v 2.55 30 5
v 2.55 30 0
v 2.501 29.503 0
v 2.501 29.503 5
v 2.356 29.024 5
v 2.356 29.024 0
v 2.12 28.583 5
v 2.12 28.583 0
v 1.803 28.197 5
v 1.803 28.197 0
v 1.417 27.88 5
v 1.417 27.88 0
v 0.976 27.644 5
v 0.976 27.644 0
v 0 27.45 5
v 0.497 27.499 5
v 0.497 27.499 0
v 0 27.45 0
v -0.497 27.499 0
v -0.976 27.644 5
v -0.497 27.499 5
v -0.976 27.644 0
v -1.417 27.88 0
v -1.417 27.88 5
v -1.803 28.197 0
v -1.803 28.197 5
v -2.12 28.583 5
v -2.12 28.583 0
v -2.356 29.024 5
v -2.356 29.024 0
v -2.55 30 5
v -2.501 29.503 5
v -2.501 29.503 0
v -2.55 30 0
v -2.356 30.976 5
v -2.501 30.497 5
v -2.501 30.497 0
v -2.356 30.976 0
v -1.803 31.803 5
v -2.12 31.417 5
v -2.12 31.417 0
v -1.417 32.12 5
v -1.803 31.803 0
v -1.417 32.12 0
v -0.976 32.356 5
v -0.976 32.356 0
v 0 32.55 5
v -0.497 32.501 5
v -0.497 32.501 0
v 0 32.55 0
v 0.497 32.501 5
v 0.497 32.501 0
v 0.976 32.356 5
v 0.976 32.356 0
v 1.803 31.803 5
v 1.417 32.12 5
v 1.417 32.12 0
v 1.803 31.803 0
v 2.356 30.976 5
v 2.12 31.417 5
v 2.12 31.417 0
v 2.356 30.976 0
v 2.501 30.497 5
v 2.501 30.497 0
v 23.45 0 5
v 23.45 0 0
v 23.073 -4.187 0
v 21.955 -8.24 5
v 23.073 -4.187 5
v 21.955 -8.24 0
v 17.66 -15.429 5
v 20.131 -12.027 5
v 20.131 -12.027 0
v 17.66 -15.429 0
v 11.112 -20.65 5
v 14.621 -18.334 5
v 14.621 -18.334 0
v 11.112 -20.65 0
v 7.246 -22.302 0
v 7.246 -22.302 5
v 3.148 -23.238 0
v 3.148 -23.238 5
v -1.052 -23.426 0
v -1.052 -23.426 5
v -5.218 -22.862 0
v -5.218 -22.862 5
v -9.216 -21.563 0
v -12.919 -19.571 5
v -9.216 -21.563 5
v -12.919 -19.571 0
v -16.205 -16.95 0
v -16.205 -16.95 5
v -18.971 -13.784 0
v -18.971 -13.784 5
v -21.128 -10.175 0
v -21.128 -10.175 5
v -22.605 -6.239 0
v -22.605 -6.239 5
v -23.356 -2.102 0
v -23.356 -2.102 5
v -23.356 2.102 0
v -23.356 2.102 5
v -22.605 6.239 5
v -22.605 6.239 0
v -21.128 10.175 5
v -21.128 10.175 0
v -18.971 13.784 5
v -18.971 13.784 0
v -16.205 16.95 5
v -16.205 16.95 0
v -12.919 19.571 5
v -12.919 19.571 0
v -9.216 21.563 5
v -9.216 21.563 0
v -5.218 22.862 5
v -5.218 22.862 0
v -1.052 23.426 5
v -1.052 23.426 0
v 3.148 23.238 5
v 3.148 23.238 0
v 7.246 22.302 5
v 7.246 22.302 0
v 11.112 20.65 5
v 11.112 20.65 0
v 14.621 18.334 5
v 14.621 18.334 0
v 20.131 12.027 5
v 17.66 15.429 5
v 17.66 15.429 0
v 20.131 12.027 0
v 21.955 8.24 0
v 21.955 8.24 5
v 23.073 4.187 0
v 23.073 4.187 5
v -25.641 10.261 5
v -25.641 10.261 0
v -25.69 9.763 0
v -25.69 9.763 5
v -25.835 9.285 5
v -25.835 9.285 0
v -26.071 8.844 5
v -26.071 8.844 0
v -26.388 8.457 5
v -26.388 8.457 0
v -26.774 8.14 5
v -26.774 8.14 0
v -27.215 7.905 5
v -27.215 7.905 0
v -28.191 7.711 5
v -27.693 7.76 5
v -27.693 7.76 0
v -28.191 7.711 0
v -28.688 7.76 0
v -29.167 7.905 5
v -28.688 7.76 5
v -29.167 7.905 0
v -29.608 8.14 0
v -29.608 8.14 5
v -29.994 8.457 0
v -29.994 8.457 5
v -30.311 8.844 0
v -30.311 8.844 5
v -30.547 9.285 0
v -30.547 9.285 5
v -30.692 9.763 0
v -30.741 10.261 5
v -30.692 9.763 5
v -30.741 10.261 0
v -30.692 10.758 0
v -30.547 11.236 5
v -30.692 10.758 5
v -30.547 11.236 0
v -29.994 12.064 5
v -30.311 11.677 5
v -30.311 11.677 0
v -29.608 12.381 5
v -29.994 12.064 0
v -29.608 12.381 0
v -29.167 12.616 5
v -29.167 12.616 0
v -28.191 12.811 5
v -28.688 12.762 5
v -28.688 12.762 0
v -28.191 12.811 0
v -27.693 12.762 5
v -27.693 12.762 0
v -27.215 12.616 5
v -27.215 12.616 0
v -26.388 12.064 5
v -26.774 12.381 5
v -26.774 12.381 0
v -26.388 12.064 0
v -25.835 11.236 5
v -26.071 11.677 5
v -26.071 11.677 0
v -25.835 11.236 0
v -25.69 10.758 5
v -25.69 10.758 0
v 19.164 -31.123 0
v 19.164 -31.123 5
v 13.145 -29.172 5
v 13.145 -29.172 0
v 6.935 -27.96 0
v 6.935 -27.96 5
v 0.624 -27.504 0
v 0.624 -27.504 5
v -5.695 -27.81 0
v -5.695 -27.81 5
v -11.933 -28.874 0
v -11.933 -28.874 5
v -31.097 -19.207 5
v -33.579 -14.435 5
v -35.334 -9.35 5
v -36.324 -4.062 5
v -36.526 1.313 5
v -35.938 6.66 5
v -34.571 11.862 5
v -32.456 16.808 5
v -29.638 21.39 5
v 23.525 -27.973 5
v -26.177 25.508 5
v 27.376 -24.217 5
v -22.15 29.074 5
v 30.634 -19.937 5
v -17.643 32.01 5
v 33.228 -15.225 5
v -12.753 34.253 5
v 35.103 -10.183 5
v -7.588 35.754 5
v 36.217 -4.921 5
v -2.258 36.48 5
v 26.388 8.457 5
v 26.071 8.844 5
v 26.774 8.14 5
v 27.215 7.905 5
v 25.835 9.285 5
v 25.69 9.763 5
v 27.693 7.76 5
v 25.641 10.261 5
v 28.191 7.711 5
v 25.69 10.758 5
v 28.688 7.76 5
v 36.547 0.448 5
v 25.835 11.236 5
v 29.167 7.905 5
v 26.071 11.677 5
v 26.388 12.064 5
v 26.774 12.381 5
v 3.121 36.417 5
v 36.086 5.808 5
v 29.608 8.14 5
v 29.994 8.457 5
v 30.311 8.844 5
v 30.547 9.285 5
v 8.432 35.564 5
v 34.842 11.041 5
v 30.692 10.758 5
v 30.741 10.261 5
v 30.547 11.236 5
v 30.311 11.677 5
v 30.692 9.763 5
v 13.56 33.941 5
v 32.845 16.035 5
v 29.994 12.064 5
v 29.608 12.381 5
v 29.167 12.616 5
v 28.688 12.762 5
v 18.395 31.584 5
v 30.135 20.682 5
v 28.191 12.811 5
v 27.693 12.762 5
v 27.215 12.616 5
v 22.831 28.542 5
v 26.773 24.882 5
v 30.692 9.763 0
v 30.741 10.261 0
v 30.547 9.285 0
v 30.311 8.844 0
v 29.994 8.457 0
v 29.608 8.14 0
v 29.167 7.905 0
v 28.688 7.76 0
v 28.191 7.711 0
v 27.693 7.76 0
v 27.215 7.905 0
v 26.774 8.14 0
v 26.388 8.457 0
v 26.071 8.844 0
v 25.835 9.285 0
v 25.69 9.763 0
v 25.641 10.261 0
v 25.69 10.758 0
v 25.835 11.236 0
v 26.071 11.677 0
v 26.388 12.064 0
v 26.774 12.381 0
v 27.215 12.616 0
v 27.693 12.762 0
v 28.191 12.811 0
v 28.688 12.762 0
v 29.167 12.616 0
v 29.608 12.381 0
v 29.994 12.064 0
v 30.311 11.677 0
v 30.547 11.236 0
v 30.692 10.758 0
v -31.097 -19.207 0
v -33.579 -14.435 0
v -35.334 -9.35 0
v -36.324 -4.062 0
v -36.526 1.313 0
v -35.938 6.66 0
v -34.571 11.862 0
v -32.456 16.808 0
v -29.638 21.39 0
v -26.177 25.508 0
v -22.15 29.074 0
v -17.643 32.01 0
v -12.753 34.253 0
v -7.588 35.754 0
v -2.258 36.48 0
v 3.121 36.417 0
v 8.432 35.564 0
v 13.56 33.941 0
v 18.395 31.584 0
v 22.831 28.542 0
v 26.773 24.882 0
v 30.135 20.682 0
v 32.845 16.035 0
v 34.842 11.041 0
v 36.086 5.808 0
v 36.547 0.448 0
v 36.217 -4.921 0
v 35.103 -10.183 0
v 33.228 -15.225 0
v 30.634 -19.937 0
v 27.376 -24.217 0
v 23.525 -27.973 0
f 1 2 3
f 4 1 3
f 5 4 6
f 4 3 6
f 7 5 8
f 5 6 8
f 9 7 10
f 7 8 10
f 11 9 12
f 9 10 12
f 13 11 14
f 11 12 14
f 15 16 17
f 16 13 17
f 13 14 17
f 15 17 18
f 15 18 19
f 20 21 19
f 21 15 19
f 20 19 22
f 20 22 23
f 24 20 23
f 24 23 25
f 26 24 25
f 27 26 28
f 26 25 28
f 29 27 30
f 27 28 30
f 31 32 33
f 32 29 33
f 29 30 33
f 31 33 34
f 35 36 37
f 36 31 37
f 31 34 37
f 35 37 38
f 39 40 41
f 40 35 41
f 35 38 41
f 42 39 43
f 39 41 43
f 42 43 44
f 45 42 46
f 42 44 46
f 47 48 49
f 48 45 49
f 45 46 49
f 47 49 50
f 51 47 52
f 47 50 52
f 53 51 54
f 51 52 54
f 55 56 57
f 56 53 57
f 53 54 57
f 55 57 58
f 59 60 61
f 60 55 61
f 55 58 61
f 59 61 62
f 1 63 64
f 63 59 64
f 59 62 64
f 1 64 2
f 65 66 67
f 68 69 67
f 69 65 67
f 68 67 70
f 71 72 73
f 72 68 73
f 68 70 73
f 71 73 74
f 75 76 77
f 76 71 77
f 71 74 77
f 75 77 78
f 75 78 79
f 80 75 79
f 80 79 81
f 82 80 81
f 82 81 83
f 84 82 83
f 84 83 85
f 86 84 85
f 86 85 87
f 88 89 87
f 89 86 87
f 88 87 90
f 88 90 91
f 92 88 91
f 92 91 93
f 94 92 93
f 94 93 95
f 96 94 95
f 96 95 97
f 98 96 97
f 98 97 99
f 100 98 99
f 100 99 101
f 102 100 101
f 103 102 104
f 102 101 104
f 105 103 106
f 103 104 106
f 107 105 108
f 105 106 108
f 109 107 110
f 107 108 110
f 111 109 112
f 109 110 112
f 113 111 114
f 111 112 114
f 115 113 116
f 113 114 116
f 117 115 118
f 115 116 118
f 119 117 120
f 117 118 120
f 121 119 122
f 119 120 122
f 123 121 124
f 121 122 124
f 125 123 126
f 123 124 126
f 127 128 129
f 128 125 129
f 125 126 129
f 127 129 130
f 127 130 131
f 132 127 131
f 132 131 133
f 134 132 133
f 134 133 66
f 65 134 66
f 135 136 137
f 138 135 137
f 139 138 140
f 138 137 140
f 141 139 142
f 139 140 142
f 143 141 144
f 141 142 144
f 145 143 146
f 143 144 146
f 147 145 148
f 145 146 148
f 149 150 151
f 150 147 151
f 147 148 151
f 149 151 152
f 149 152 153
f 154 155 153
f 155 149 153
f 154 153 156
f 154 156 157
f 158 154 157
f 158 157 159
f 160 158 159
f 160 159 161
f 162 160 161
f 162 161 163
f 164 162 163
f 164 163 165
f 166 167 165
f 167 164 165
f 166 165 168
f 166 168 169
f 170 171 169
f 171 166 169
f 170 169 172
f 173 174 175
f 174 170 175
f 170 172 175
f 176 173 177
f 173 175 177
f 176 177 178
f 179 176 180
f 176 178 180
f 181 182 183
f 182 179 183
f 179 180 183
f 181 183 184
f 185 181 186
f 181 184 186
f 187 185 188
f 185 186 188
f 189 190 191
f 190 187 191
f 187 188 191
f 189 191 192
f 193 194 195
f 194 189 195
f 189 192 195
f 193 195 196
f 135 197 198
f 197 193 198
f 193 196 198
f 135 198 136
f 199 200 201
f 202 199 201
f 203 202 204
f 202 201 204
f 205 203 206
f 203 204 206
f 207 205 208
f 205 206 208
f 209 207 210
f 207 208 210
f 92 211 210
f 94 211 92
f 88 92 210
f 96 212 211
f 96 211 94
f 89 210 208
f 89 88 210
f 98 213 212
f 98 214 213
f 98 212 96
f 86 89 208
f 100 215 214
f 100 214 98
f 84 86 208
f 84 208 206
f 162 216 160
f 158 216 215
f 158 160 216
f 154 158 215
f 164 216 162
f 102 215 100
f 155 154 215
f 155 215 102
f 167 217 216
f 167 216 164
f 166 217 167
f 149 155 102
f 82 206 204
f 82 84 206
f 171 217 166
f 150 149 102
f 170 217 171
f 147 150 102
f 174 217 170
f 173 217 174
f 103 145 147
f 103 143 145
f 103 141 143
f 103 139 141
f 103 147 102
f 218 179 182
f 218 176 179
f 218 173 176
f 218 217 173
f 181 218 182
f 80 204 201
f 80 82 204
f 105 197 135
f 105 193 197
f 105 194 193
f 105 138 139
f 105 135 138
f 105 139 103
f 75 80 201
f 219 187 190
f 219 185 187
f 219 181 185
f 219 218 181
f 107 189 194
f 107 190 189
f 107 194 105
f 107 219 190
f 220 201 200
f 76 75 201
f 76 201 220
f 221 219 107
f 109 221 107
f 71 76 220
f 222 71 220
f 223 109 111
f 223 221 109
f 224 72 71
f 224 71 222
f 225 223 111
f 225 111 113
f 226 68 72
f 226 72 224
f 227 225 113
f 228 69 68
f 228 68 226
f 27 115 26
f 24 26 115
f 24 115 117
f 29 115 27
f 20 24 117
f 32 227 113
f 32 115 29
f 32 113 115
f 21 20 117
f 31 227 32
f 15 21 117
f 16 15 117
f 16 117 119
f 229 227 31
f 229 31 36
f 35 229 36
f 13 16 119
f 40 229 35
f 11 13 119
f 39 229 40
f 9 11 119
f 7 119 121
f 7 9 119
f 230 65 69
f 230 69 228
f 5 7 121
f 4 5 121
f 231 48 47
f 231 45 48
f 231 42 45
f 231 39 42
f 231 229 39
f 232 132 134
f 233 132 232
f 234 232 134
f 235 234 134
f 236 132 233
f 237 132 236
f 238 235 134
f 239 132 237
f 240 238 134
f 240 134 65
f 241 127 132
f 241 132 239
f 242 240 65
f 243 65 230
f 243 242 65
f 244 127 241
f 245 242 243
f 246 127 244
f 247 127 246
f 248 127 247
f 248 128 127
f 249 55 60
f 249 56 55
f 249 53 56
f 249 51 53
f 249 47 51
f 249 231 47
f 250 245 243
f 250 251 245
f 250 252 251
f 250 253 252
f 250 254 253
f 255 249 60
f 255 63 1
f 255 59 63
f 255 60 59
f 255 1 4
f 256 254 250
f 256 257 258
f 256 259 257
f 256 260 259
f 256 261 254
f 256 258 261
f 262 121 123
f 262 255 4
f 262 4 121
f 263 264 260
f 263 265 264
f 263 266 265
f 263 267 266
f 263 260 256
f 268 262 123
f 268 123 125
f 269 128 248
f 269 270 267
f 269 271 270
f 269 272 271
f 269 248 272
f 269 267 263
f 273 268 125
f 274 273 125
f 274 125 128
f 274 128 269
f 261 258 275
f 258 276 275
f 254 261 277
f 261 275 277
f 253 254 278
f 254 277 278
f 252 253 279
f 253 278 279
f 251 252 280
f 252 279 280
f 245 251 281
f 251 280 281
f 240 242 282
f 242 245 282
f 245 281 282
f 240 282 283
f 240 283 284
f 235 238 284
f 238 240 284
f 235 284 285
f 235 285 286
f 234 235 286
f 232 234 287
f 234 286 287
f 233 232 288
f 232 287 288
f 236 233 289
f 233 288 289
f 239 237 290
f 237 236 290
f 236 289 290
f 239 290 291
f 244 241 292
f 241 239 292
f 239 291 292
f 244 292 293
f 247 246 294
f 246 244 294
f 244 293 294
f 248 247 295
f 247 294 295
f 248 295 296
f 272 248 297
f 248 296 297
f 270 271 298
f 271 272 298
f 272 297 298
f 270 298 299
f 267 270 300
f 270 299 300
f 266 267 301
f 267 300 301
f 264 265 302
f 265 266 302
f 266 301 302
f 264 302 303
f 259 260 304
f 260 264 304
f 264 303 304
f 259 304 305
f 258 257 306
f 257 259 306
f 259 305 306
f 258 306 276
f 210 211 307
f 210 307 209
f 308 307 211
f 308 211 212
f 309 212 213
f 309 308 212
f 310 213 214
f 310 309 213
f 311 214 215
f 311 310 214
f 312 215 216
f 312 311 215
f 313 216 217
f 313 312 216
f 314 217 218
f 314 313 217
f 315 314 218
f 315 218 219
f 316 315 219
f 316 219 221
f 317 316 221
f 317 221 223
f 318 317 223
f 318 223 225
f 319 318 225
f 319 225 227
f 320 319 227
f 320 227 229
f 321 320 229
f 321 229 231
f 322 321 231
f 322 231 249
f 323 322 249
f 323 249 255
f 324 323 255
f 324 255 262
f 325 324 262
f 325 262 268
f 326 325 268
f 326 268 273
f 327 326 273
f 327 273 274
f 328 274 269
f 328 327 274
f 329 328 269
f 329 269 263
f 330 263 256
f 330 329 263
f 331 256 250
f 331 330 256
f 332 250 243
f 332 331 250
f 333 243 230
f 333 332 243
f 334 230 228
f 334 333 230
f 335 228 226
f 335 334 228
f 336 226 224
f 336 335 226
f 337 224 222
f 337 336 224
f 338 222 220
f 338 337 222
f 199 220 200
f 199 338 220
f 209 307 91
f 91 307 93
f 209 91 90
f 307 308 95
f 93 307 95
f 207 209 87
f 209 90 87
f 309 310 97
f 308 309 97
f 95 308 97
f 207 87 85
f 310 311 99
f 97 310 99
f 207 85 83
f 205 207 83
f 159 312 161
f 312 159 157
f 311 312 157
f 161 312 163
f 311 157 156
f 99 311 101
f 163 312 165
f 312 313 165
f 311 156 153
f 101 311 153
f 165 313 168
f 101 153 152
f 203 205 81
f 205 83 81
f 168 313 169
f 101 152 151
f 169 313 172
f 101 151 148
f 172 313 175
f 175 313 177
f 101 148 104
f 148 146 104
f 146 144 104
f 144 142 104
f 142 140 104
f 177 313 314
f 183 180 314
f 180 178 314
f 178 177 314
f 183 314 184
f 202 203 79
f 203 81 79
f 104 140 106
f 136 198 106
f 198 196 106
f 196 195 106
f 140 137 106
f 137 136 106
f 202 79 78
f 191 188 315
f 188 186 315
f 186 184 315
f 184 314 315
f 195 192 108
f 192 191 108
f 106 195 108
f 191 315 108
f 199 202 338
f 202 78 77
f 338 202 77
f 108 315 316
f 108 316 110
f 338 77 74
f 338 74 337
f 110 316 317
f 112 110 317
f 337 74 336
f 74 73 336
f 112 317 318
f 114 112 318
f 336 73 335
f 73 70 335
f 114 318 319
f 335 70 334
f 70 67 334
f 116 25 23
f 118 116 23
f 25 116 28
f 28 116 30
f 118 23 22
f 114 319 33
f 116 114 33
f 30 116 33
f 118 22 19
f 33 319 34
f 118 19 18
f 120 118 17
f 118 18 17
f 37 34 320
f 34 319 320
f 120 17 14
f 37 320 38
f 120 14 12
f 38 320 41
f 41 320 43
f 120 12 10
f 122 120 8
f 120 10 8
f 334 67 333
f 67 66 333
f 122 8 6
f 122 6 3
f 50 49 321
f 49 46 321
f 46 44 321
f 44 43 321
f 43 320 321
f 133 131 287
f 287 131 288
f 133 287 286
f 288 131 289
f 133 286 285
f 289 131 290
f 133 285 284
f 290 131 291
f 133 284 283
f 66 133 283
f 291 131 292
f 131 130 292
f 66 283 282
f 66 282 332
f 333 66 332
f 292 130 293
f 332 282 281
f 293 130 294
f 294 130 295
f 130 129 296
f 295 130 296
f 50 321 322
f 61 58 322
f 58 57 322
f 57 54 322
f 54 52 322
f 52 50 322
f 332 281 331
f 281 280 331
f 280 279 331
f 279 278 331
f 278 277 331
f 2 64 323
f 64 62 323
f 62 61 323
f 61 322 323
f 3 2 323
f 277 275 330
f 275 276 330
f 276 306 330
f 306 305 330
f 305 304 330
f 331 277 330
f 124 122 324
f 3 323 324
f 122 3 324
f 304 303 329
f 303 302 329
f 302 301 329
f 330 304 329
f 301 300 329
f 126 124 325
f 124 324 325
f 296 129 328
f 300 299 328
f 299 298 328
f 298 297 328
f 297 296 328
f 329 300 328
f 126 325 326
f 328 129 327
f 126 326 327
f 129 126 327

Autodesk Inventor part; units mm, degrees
ref_plane "YZ Plane" through (0, 0, 0) normal (1, 0, 0) x (0, 1, 0)
ref_plane "XZ Plane" through (0, 0, 0) normal (0, 1, 0) x (-1, 0, 0)
ref_plane "XY Plane" through (0, 0, 0) normal (0, 0, 1) x (1, 0, 0)
sketch "スケッチ1" plane through (0, 0, 0) normal (0, 0, 1) x (1, 0, 0)
  circle A0 centre (0, 0) radius 23.45
  circle A1 centre (0, 0) radius 36.55
  line L0 (0, 0) -> (-28.1908, 10.2606) construction
  line L1 (0, 0) -> (28.1908, 10.2606) construction
  line L2 (-39.5959, 0) -> (43.1917, 0) construction
  line L3 (0, 0) -> (0, 30) construction
  circle A2 centre (-28.1908, 10.2606) radius 2.55
  circle A3 centre (0, 30) radius 2.55
  circle A4 centre (28.1908, 10.2606) radius 2.55
  dimension "d0" = 73.1
  dimension "d1" = 46.9
  dimension "d2" = 30
  dimension "d3" = 30
  dimension "d6" = 20
  dimension "d7" = 20
  dimension "d8" = 30
  dimension "d9" = 5.1
  dimension "d10" = 5.1
  dimension "d11" = 5.1
extrude "押し出し1" add sketch "スケッチ1" along normal blind 5
sketch "スケッチ2" plane through (0, 0, 5) normal (0, 0, 1) x (1, 0, 0)
  line L0 (0, 0) -> (0, -80) construction
  circle A0 centre (0, -80) radius 52.5
  dimension "d14" = 80
  dimension "d18" = 105
extrude "押し出し2" cut sketch "スケッチ2" against normal blind 10
sketch "スケッチ3" plane through (0, 0, 5) normal (0, 0, 1) x (1, 0, 0)
  circle A0 centre (28.1908, 10.2606) radius 2.55 projected
  line L0 (0, 0) -> (28.1908, 10.2606)
  circle A1 centre (-28.1908, 10.2606) radius 2.55 projected
  line L1 (-28.1908, 10.2606) -> (0, 0)
  circle A2 centre (0, 30) radius 2.55 projected
  line L2 (0, 0) -> (0, 30)
sketch "スケッチ4" plane through (0, 0, 5) normal (0, 0, 1) x (1, 0, 0)
  arc A0 (19.1643, -31.1228) -> (-19.1643, -31.1228) centre (0, 0) ccw projected
  line L0 (-31.0967, -19.2067) -> (-11.9326, -28.874)
  arc A1 (19.1643, -31.1228) -> (-19.1643, -31.1228) centre (0, -80) ccw projected
  line L1 (-31.0967, -19.2067) -> (-38.9528, -25.1507)
  line L2 (-38.9528, -25.1507) -> (-33.0141, -34.3769)
  line L3 (-33.0141, -34.3769) -> (-12.5468, -31.9378)
  line L4 (-12.5468, -31.9378) -> (-11.9326, -28.874)
  line L5 (-31.0967, -19.2067) -> (-11.9326, -28.874)
  line L6 (-29.2537, -31.1228) -> (-31.0967, -19.2067)
extrude "押し出し3" cut sketch "スケッチ4" against normal blind 10 contours L0 A1 A0 picked at (-23.5945, -23.9544)
properties part number "円 46.9mm" material "アルミニウム 6061"
